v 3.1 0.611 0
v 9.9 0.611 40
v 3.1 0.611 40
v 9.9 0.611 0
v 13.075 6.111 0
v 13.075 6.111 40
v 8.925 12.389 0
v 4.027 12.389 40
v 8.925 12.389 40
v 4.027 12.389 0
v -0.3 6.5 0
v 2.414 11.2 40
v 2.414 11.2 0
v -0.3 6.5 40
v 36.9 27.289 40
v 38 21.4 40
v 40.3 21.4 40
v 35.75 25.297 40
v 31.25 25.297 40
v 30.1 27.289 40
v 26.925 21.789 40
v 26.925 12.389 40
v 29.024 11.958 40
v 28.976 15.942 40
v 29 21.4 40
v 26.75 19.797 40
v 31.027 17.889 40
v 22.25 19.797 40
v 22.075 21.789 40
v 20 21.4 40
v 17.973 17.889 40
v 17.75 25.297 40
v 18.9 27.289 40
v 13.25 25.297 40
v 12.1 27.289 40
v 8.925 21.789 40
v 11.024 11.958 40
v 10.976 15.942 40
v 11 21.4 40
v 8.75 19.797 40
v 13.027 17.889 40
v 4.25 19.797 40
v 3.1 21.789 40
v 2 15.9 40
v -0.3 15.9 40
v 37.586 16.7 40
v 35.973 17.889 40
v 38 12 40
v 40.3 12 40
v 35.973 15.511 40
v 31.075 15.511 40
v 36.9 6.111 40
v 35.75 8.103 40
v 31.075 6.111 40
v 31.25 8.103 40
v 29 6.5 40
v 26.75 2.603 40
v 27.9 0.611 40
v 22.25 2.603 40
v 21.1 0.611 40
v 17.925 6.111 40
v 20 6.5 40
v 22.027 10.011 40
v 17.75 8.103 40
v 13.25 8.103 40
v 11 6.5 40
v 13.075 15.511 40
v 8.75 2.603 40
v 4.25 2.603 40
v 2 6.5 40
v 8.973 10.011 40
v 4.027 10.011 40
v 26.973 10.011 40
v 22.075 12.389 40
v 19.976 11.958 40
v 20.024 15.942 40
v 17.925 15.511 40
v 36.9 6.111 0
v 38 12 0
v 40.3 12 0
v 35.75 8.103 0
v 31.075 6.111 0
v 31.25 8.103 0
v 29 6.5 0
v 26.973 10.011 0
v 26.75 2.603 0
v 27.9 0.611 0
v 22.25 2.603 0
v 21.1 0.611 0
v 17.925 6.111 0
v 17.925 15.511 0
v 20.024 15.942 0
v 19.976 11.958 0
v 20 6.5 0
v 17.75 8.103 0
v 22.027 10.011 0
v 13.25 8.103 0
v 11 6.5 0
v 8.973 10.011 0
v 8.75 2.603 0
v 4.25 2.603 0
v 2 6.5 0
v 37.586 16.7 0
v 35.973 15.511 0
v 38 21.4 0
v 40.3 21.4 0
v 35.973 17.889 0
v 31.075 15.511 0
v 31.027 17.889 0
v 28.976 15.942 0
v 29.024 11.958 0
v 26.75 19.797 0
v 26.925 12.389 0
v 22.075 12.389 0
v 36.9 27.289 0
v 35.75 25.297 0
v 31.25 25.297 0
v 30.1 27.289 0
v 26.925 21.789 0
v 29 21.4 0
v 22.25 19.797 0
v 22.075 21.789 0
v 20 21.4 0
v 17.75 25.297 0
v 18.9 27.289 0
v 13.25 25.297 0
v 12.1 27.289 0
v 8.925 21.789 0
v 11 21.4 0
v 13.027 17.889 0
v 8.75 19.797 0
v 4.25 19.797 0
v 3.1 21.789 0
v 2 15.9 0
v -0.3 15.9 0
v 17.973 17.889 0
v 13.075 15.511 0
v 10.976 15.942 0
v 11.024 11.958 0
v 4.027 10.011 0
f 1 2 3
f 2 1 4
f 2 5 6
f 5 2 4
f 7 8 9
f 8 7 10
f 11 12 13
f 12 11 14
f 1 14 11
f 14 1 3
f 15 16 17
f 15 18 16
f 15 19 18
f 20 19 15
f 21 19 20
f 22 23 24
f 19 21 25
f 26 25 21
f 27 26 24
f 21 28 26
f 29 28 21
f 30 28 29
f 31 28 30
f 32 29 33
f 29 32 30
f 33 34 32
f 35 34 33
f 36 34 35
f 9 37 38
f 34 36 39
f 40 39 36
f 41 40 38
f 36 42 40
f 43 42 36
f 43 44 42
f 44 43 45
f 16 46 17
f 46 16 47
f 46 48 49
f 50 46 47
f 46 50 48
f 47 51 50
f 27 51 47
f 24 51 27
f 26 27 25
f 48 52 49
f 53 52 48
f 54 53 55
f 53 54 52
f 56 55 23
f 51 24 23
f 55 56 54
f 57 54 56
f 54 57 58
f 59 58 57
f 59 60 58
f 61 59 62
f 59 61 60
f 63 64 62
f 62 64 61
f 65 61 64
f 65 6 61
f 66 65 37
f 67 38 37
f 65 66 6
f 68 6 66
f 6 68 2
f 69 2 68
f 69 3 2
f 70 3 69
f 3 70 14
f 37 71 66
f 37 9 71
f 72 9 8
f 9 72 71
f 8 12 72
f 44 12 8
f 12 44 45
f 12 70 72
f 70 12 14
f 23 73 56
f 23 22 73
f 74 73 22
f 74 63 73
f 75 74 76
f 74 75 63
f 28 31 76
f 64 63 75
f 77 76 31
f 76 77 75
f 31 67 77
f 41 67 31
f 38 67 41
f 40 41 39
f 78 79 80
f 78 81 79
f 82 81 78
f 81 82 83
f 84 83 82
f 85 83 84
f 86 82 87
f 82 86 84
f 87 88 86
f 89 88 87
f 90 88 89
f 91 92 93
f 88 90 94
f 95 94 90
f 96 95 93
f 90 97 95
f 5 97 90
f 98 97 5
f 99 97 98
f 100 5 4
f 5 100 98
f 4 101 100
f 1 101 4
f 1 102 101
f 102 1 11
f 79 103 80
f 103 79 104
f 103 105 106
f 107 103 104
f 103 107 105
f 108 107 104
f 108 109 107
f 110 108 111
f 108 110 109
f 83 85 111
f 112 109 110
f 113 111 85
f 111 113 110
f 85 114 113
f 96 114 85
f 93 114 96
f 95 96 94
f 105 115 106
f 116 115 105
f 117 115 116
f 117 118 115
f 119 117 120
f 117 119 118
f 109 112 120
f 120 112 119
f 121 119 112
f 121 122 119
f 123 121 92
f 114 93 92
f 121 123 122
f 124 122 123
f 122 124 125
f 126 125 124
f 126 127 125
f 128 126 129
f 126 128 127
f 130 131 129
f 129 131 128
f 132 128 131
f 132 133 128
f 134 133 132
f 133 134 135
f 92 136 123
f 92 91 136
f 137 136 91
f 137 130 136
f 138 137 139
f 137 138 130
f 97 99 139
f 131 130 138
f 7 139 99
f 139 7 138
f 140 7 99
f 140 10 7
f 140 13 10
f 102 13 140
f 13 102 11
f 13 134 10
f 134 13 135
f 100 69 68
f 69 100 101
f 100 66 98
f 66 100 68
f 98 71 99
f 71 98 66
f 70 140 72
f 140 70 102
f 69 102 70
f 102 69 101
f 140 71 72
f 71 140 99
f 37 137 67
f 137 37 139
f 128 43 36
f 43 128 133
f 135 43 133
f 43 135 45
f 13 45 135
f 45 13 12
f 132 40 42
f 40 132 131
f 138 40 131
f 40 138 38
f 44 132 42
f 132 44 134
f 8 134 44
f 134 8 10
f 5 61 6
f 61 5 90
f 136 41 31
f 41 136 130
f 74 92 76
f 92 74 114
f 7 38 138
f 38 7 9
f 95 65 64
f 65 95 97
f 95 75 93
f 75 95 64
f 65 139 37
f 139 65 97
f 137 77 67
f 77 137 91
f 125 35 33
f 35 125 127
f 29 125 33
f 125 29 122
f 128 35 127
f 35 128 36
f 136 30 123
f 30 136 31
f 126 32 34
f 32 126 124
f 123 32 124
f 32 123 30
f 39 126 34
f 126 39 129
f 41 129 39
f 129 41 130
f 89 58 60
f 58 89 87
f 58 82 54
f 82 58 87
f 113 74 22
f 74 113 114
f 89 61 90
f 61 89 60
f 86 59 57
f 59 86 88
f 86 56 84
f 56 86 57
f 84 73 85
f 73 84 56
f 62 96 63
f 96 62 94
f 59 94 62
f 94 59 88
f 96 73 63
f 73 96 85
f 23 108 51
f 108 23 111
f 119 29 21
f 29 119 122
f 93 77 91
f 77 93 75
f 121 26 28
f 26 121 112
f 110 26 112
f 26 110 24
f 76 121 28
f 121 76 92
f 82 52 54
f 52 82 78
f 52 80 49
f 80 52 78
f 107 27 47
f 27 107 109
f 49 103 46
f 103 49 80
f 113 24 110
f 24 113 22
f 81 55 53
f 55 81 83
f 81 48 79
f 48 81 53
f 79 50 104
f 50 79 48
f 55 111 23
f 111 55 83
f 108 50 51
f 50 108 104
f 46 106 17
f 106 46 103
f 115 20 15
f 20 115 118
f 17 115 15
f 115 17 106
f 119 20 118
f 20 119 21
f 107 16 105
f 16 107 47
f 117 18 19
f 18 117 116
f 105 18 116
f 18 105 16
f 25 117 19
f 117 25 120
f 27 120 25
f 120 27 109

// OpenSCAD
 /*!
@brief A Nest for Bees
@details This OpenSCAD script will generate a simple multi unit Bpartment to hold your Bees

@author Mark Gaffney
@version 0.4
@date 2013-03-19

@todo
Fill with Bees!

@warning
Bees should not be disturbed willy nilly!

@note
Changes from previous versions:
0.4
 - renamed some varaibles to make more easy to use with "MakerBot's Thingiverse Customizer"
 - fixed some alignment issues with hexagons
 - fixed off by 1 error for rows and columns
 - fixed some manifoldness issues with cutouts
0.3
 - fixed up some translates to properly account for the chosen wall thickness
 - added option to make hexagons...but it's not very pretty
0.2
 - added union command so all the cells are joined as one solid piece
0.1
 - First implementation

@attention
Copyright (c) 2013 Tyndall National Institute.
All rights reserved.
Permission to use, copy, modify, and distribute this software and its documentation for any purpose, without fee, and without written agreement is hereby granted, provided that the above copyright notice and the following two paragraphs appear in all copies of this software. 

IN NO EVENT SHALL TYNDALL NATIONAL INSTITUTE BE LIABLE TO ANY PARTY FOR DIRECT, INDIRECT, SPECIAL, INCIDENTAL, OR CONSEQUENTIAL DAMAGES ARISING OUT OF THE USE OF THIS SOFTWARE AND ITS DOCUMENTATION, EVEN IF TYNDALL NATIONAL INSTITUTE HAS BEEN ADVISED OF THE POSSIBILITY OF SUCH DAMAGE.

TYNDALL NATIONAL INSTITUTE SPECIFICALLY DISCLAIMS ANY WARRANTIES, INCLUDING, BUT NOT LIMITED TO, THE IMPLIED WARRANTIES OF MERCHANTABILITY AND FITNESS FOR A PARTICULAR PURPOSE.  THE SOFTWARE PROVIDED HEREUNDER IS ON AN "AS IS" BASIS, AND TYNDALL NATIONAL INSTITUTE HAS NO OBLIGATION TO PROVIDE MAINTENANCE, SUPPORT, UPDATES, ENHANCEMENTS, OR MODIFICATIONS.
*/


//**************User*Variables*****************
//these values are all in millimetres... of course! Change them to suit your printer and bee population!

/* [Bpartment Size and Shape] */
// Height: How long a tunnel does your bee like?
height=40;//[20:100]
//Inner Diameter: How wide is your bee?
inner_d=9;// [5:40]
// Wall Thickness: How thin a wall call your printer produce?
wall_t=2;//[0.1:5]
// Row Count: How many floors in this Bpartment?
rows=2;//[1:10]
// Column Count: How many Bpartments per floor?
columns=4;//[1:10]
//Hexagons or Circles: What shape is each Bpartment?
use_hexagons=1;//[0:circle, 1:hexagon]
//If hexagons appear not to mesh nicely try using this
fix=0;//[0:1]

//*********************Calls*******************
/* [Hidden] */
a_bit=0.1;
$fn=6*use_hexagons;//if using circles get 0 which causes OpenSCAD to use the default value instead

union(){

translate(v=[wall_t+(inner_d/2),wall_t+(inner_d/2),height/2]){
	for (i=[0:columns-1]){
		translate (v=[i*(inner_d+(wall_t/2)) -(wall_t/2)*i*use_hexagons,(i%2)*((wall_t+inner_d)/2 -use_hexagons*0.0*wall_t ),0]){
			for (j=[0:rows-1]){
				translate (v=[0,j*(inner_d+wall_t)-j*use_hexagons*0.8*wall_t,0]){
					difference(){
						rotate(a=30*use_hexagons*fix, v=[0,0,1]) cylinder(h=height, r=(inner_d/2)+wall_t+wall_t*use_hexagons*0.15, center=true);
						rotate(a=30*use_hexagons*fix, v=[0,0,1]) cylinder(h=height+2*a_bit, r=(inner_d/2), center=true);
					}
				}
			}
		}
	}
}


}
